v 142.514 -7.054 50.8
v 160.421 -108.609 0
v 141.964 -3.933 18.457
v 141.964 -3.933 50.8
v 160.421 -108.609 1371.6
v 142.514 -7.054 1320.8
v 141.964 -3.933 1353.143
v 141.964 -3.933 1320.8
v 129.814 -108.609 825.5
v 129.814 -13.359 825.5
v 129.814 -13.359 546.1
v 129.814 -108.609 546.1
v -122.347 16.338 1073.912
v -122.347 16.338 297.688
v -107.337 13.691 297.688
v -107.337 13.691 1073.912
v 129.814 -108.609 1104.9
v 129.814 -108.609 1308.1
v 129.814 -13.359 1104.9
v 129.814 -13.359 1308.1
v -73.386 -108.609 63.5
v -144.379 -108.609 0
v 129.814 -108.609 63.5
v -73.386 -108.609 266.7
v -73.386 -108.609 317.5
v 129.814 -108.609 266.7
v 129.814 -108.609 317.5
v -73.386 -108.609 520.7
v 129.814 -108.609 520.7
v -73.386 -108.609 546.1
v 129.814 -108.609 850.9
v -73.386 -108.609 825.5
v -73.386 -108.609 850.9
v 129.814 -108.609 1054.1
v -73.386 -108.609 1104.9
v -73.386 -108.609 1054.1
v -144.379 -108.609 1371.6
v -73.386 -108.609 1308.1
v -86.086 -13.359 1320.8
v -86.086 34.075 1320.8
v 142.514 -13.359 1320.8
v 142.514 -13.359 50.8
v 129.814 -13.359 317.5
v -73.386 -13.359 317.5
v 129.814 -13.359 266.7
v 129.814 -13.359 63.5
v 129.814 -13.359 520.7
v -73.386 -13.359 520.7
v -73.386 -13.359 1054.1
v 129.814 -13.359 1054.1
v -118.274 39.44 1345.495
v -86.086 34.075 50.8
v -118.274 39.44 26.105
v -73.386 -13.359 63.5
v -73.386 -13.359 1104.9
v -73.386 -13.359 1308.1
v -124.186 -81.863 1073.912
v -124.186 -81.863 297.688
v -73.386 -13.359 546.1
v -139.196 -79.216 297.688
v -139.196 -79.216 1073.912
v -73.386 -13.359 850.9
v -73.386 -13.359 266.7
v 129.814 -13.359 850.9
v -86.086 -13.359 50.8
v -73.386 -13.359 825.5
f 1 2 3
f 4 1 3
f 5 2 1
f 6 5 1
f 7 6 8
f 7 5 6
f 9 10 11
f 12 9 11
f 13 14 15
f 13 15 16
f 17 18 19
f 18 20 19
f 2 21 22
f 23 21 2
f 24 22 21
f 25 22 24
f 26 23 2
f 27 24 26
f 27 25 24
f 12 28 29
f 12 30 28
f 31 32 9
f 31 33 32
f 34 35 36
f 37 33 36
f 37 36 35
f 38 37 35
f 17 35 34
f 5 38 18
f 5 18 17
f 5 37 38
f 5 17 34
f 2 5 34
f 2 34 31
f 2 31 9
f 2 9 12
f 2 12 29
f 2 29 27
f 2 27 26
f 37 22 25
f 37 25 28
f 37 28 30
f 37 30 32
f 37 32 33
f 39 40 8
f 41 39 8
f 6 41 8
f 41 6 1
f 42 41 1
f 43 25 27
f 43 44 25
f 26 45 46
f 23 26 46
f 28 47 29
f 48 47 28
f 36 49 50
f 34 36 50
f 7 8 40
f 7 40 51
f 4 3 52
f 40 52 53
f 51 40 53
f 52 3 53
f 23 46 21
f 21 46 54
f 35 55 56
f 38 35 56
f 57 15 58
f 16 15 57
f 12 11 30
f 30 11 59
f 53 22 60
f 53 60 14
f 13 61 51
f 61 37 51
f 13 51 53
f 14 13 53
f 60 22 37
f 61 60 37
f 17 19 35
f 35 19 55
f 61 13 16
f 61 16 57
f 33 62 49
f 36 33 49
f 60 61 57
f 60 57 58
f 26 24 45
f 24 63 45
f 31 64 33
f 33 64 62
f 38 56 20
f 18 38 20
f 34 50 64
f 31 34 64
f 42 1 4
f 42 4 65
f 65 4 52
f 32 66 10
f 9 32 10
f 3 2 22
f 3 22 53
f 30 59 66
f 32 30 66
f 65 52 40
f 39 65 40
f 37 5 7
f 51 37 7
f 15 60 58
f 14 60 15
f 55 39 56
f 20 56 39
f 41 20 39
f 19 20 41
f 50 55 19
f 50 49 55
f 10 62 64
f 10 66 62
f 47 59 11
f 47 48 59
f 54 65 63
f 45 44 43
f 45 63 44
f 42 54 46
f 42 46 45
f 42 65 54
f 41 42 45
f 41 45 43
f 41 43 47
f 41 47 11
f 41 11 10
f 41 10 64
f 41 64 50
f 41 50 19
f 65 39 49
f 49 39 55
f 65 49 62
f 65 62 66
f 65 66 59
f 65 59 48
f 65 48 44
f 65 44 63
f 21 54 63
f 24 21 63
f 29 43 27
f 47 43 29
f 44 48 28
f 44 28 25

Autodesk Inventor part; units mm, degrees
ref_plane "YZ Plane" through (0, 0, 0) normal (1, 0, 0) x (0, 1, 0)
ref_plane "XZ Plane" through (0, 0, 0) normal (0, 1, 0) x (-1, 0, 0)
ref_plane "XY Plane" through (0, 0, 0) normal (0, 0, 1) x (1, 0, 0)
sketch "Sketch4" plane through (0, 0, 0) normal (0, 0, 1) x (1, 0, 0)
  line L0 (-144.3789, 43.7906) -> (-144.3789, -108.6094)
  line L1 (-144.3789, -108.6094) -> (160.4211, -108.6094)
  line L2 (160.4211, -108.6094) -> (160.4211, -7.0094)
  line L3 (160.4211, -7.0094) -> (-144.3789, 43.7906)
  point P0 (0, 0)
  dimension "d6" = 304.8
  dimension "d7" = 152.4
  dimension "d8" = 101.6
extrude "Body" add sketch "Sketch4" along normal blind 1371.6
sketch "Sketch5" plane through (160.4211, -108.6094, 0) normal (1, 0, 0) x (0, 0, -1)
  line L0 (-1371.6, 0) -> (-1371.6, 101.6) projected
  line L1 (0, 0) -> (-1371.6, 0) projected
  line L2 (-1371.6, 0) -> (-1318.7374, 299.7986)
  line L3 (-1318.7374, 299.7986) -> (-1508.9577, 299.7986)
  line L4 (-1371.6, 152.4) -> (-1371.6, 0) projected
  line L5 (-1508.9577, 299.7986) -> (-1371.6, 0)
  point P0 (0, 108.6094)
  dimension "d11" = 10
extrude "LeftBevel" cut sketch "Sketch5" against normal blind 1371.6
sketch "Sketch6" plane through (160.4211, -108.6094, 0) normal (1, 0, 0) x (0, 0, -1)
  line L0 (0, 0) -> (0, 101.6) projected
  line L1 (0, 0) -> (-1371.6, 0) projected
  line L2 (0, 0) -> (-29.2918, 166.1219)
  line L3 (-29.2918, 166.1219) -> (35.444, 166.1219)
  line L4 (35.444, 166.1219) -> (0, 0)
  point P0 (0, 108.6094)
  dimension "d14" = 10
extrude "RightBevel" cut sketch "Sketch6" against normal blind 1371.6
sketch "Sketch7" plane through (0, 0, 1371.6) normal (0, 0, 1) x (1, 0, 0)
  line L0 (-144.3789, 43.7906) -> (-144.3789, -108.6094) projected
  line L1 (-144.3789, -108.6094) -> (-110.1629, 85.4397)
  line L2 (-110.1629, 85.4397) -> (-236.272, 85.4397)
  line L3 (-236.272, 85.4397) -> (-144.3789, -108.6094)
  point P0 (0, 0)
  dimension "d17" = 10
extrude "BackBevel" cut sketch "Sketch7" against normal blind 1371.6
sketch "Sketch8" plane through (0, 0, 1371.6) normal (0, 0, 1) x (1, 0, 0)
  line L0 (160.4211, -108.6094) -> (160.4211, -7.0094) projected
  line L1 (-144.3789, -108.6094) -> (160.4211, -108.6094) projected
  line L2 (160.4211, -108.6094) -> (129.3641, 67.5233)
  line L3 (129.3641, 67.5233) -> (267.9679, 67.5233)
  line L4 (267.9679, 67.5233) -> (160.4211, -108.6094)
  point P0 (0, 0)
  dimension "d20" = 10
extrude "FrontBevel" cut sketch "Sketch8" against normal blind 1371.6
sketch "Sketch9" plane through (-144.3789, -108.6094, 0) normal (0, -1, 0) x (1, 0, 0)
  line L0 (286.893, 1320.8) -> (58.293, 1320.8)
  line L1 (58.293, 1320.8) -> (58.293, 50.8)
  line L2 (58.293, 50.8) -> (286.893, 50.8)
  line L3 (286.893, 50.8) -> (286.893, 1320.8)
  line L4 (304.8, 0) -> (304.8, 1371.6) projected
  line L5 (0, 0) -> (304.8, 0) projected
  line L6 (0, 1371.6) -> (304.8, 1371.6) projected
  point P0 (144.3789, 0)
  dimension "d24" = 228.6
  dimension "d25" = 17.907
  dimension "d26" = 50.8
  dimension "d31" = 50.8
extrude "BottomEx" add sketch "Sketch9" against normal blind 152.4
sketch "Sketch10" plane through (-144.3789, 43.7906, 0) normal (0, 1, 0) x (1, 0, 0)
  line L0 (58.293, -1320.8) -> (286.893, -1320.8) projected
  line L1 (286.893, -1320.8) -> (286.893, -50.8) projected
  line L2 (286.893, -50.8) -> (58.293, -50.8) projected
  line L3 (58.293, -50.8) -> (58.293, -1320.8) projected
  line L4 (58.293, -50.8) -> (286.893, -50.8) projected
  line L5 (286.893, -50.8) -> (58.293, -50.8)
  line L6 (58.293, -50.8) -> (58.293, -1320.8)
  line L7 (58.293, -1320.8) -> (286.893, -1320.8)
  line L8 (286.893, -1320.8) -> (286.893, -50.8)
  point P0 (144.3789, 0)
  point P1 (26.1051, -50.8)
extrude "Extrusion8" cut sketch "Sketch10" against normal blind 57.15
sketch "Sketch11" plane through (-144.3789, -13.3594, 0) normal (0, 1, 0) x (1, 0, 0)
  line L0 (70.993, -266.7) -> (274.193, -266.7)
  line L1 (274.193, -266.7) -> (274.193, -63.5)
  line L2 (274.193, -63.5) -> (70.993, -63.5)
  line L3 (70.993, -63.5) -> (70.993, -266.7)
  line L4 (58.293, -1320.8) -> (58.293, -50.8) projected
  line L5 (58.293, -50.8) -> (286.893, -50.8) projected
  point P0 (144.3789, 0)
  dimension "d32" = 203.2
  dimension "d33" = 203.2
  dimension "d34" = 12.7
  dimension "d35" = 12.7
extrude "Extrusion9" cut sketch "Sketch11" against normal blind 174.625
sketch "Sketch12" plane through (-144.3789, -13.3594, 0) normal (0, 1, 0) x (1, 0, 0)
  line L0 (58.293, -1320.8) -> (58.293, -50.8) projected
  line L1 (286.893, -1320.8) -> (58.293, -1320.8) projected
  line L2 (70.993, -1308.1) -> (274.193, -1308.1)
  line L3 (274.193, -1308.1) -> (274.193, -1104.9)
  line L4 (274.193, -1104.9) -> (70.993, -1104.9)
  line L5 (70.993, -1104.9) -> (70.993, -1308.1)
  point P0 (144.3789, 0)
  dimension "d38" = 203.2
  dimension "d39" = 203.2
  dimension "d40" = 12.7
  dimension "d41" = 12.7
extrude "Extrusion10" cut sketch "Sketch12" against normal blind 166.6875
sketch "Sketch13" plane through (-144.3789, -13.3594, 0) normal (0, 1, 0) x (1, 0, 0)
  line L0 (70.993, -266.7) -> (70.993, -63.5) projected
  line L1 (70.993, -266.7) -> (274.193, -266.7) projected
  line L2 (274.193, -266.7) -> (70.993, -266.7) projected
  line L3 (274.193, -266.7) -> (70.993, -266.7) projected
  line L4 (70.993, -317.5) -> (274.193, -317.5)
  line L5 (274.193, -317.5) -> (274.193, -520.7)
  line L6 (274.193, -520.7) -> (70.993, -520.7)
  line L7 (70.993, -520.7) -> (70.993, -317.5)
  point P0 (144.3789, 0)
  dimension "d44" = 0
  dimension "d45" = 50.8
  dimension "d46" = 203.2
  dimension "d47" = 203.2
extrude "Extrusion11" cut sketch "Sketch13" against normal blind 166.6875
sketch "Sketch14" plane through (-144.3789, -13.3594, 0) normal (0, 1, 0) x (1, 0, 0)
  line L0 (70.993, -1308.1) -> (70.993, -1104.9) projected
  line L1 (70.993, -1104.9) -> (274.193, -1104.9) projected
  line L2 (70.993, -1054.1) -> (274.193, -1054.1)
  line L3 (274.193, -1054.1) -> (274.193, -850.9)
  line L4 (274.193, -850.9) -> (70.993, -850.9)
  line L5 (70.993, -850.9) -> (70.993, -1054.1)
  point P0 (144.3789, 0)
  dimension "d50" = 0
  dimension "d51" = 50.8
  dimension "d52" = 203.2
  dimension "d53" = 203.2
extrude "Extrusion12" cut sketch "Sketch14" against normal blind 166.6875
sketch "Sketch15" plane through (-144.3789, -13.3594, 0) normal (0, 1, 0) x (1, 0, 0)
  line L0 (70.993, -825.5) -> (274.193, -825.5)
  line L1 (274.193, -825.5) -> (274.193, -546.1)
  line L2 (274.193, -546.1) -> (70.993, -546.1)
  line L3 (70.993, -546.1) -> (70.993, -825.5)
  line L4 (70.993, -520.7) -> (70.993, -317.5) projected
  line L5 (274.193, -520.7) -> (70.993, -520.7) projected
  line L6 (70.993, -850.9) -> (274.193, -850.9) projected
  point P0 (144.3789, 0)
  dimension "d56" = 279.4
  dimension "d57" = 203.2
  dimension "d58" = 0
  dimension "d59" = 25.4
  dimension "d60" = 25.4
extrude "Extrusion13" cut sketch "Sketch15" against normal blind 166.6875
sketch "Sketch16" plane through (-144.3789, -108.6094, 0) normal (-0.9848, 0.1736, 0) x (0, 0, 1)
  line L0 (297.688, 126.8744) -> (1073.912, 126.8744)
  line L1 (1073.912, 126.8744) -> (1073.912, 29.8464)
  line L2 (1073.912, 29.8464) -> (297.688, 29.8464)
  line L3 (297.688, 29.8464) -> (297.688, 126.8744)
  line L4 (0, 0) -> (0, 150.3331) projected
  point P0 (0, 132.0305)
  dimension "d63" = 97.028
  dimension "d64" = 776.224
  dimension "d65" = 297.688
extrude "Extrusion14" cut sketch "Sketch16" against normal blind 15.24
properties part number "FullConsole"
